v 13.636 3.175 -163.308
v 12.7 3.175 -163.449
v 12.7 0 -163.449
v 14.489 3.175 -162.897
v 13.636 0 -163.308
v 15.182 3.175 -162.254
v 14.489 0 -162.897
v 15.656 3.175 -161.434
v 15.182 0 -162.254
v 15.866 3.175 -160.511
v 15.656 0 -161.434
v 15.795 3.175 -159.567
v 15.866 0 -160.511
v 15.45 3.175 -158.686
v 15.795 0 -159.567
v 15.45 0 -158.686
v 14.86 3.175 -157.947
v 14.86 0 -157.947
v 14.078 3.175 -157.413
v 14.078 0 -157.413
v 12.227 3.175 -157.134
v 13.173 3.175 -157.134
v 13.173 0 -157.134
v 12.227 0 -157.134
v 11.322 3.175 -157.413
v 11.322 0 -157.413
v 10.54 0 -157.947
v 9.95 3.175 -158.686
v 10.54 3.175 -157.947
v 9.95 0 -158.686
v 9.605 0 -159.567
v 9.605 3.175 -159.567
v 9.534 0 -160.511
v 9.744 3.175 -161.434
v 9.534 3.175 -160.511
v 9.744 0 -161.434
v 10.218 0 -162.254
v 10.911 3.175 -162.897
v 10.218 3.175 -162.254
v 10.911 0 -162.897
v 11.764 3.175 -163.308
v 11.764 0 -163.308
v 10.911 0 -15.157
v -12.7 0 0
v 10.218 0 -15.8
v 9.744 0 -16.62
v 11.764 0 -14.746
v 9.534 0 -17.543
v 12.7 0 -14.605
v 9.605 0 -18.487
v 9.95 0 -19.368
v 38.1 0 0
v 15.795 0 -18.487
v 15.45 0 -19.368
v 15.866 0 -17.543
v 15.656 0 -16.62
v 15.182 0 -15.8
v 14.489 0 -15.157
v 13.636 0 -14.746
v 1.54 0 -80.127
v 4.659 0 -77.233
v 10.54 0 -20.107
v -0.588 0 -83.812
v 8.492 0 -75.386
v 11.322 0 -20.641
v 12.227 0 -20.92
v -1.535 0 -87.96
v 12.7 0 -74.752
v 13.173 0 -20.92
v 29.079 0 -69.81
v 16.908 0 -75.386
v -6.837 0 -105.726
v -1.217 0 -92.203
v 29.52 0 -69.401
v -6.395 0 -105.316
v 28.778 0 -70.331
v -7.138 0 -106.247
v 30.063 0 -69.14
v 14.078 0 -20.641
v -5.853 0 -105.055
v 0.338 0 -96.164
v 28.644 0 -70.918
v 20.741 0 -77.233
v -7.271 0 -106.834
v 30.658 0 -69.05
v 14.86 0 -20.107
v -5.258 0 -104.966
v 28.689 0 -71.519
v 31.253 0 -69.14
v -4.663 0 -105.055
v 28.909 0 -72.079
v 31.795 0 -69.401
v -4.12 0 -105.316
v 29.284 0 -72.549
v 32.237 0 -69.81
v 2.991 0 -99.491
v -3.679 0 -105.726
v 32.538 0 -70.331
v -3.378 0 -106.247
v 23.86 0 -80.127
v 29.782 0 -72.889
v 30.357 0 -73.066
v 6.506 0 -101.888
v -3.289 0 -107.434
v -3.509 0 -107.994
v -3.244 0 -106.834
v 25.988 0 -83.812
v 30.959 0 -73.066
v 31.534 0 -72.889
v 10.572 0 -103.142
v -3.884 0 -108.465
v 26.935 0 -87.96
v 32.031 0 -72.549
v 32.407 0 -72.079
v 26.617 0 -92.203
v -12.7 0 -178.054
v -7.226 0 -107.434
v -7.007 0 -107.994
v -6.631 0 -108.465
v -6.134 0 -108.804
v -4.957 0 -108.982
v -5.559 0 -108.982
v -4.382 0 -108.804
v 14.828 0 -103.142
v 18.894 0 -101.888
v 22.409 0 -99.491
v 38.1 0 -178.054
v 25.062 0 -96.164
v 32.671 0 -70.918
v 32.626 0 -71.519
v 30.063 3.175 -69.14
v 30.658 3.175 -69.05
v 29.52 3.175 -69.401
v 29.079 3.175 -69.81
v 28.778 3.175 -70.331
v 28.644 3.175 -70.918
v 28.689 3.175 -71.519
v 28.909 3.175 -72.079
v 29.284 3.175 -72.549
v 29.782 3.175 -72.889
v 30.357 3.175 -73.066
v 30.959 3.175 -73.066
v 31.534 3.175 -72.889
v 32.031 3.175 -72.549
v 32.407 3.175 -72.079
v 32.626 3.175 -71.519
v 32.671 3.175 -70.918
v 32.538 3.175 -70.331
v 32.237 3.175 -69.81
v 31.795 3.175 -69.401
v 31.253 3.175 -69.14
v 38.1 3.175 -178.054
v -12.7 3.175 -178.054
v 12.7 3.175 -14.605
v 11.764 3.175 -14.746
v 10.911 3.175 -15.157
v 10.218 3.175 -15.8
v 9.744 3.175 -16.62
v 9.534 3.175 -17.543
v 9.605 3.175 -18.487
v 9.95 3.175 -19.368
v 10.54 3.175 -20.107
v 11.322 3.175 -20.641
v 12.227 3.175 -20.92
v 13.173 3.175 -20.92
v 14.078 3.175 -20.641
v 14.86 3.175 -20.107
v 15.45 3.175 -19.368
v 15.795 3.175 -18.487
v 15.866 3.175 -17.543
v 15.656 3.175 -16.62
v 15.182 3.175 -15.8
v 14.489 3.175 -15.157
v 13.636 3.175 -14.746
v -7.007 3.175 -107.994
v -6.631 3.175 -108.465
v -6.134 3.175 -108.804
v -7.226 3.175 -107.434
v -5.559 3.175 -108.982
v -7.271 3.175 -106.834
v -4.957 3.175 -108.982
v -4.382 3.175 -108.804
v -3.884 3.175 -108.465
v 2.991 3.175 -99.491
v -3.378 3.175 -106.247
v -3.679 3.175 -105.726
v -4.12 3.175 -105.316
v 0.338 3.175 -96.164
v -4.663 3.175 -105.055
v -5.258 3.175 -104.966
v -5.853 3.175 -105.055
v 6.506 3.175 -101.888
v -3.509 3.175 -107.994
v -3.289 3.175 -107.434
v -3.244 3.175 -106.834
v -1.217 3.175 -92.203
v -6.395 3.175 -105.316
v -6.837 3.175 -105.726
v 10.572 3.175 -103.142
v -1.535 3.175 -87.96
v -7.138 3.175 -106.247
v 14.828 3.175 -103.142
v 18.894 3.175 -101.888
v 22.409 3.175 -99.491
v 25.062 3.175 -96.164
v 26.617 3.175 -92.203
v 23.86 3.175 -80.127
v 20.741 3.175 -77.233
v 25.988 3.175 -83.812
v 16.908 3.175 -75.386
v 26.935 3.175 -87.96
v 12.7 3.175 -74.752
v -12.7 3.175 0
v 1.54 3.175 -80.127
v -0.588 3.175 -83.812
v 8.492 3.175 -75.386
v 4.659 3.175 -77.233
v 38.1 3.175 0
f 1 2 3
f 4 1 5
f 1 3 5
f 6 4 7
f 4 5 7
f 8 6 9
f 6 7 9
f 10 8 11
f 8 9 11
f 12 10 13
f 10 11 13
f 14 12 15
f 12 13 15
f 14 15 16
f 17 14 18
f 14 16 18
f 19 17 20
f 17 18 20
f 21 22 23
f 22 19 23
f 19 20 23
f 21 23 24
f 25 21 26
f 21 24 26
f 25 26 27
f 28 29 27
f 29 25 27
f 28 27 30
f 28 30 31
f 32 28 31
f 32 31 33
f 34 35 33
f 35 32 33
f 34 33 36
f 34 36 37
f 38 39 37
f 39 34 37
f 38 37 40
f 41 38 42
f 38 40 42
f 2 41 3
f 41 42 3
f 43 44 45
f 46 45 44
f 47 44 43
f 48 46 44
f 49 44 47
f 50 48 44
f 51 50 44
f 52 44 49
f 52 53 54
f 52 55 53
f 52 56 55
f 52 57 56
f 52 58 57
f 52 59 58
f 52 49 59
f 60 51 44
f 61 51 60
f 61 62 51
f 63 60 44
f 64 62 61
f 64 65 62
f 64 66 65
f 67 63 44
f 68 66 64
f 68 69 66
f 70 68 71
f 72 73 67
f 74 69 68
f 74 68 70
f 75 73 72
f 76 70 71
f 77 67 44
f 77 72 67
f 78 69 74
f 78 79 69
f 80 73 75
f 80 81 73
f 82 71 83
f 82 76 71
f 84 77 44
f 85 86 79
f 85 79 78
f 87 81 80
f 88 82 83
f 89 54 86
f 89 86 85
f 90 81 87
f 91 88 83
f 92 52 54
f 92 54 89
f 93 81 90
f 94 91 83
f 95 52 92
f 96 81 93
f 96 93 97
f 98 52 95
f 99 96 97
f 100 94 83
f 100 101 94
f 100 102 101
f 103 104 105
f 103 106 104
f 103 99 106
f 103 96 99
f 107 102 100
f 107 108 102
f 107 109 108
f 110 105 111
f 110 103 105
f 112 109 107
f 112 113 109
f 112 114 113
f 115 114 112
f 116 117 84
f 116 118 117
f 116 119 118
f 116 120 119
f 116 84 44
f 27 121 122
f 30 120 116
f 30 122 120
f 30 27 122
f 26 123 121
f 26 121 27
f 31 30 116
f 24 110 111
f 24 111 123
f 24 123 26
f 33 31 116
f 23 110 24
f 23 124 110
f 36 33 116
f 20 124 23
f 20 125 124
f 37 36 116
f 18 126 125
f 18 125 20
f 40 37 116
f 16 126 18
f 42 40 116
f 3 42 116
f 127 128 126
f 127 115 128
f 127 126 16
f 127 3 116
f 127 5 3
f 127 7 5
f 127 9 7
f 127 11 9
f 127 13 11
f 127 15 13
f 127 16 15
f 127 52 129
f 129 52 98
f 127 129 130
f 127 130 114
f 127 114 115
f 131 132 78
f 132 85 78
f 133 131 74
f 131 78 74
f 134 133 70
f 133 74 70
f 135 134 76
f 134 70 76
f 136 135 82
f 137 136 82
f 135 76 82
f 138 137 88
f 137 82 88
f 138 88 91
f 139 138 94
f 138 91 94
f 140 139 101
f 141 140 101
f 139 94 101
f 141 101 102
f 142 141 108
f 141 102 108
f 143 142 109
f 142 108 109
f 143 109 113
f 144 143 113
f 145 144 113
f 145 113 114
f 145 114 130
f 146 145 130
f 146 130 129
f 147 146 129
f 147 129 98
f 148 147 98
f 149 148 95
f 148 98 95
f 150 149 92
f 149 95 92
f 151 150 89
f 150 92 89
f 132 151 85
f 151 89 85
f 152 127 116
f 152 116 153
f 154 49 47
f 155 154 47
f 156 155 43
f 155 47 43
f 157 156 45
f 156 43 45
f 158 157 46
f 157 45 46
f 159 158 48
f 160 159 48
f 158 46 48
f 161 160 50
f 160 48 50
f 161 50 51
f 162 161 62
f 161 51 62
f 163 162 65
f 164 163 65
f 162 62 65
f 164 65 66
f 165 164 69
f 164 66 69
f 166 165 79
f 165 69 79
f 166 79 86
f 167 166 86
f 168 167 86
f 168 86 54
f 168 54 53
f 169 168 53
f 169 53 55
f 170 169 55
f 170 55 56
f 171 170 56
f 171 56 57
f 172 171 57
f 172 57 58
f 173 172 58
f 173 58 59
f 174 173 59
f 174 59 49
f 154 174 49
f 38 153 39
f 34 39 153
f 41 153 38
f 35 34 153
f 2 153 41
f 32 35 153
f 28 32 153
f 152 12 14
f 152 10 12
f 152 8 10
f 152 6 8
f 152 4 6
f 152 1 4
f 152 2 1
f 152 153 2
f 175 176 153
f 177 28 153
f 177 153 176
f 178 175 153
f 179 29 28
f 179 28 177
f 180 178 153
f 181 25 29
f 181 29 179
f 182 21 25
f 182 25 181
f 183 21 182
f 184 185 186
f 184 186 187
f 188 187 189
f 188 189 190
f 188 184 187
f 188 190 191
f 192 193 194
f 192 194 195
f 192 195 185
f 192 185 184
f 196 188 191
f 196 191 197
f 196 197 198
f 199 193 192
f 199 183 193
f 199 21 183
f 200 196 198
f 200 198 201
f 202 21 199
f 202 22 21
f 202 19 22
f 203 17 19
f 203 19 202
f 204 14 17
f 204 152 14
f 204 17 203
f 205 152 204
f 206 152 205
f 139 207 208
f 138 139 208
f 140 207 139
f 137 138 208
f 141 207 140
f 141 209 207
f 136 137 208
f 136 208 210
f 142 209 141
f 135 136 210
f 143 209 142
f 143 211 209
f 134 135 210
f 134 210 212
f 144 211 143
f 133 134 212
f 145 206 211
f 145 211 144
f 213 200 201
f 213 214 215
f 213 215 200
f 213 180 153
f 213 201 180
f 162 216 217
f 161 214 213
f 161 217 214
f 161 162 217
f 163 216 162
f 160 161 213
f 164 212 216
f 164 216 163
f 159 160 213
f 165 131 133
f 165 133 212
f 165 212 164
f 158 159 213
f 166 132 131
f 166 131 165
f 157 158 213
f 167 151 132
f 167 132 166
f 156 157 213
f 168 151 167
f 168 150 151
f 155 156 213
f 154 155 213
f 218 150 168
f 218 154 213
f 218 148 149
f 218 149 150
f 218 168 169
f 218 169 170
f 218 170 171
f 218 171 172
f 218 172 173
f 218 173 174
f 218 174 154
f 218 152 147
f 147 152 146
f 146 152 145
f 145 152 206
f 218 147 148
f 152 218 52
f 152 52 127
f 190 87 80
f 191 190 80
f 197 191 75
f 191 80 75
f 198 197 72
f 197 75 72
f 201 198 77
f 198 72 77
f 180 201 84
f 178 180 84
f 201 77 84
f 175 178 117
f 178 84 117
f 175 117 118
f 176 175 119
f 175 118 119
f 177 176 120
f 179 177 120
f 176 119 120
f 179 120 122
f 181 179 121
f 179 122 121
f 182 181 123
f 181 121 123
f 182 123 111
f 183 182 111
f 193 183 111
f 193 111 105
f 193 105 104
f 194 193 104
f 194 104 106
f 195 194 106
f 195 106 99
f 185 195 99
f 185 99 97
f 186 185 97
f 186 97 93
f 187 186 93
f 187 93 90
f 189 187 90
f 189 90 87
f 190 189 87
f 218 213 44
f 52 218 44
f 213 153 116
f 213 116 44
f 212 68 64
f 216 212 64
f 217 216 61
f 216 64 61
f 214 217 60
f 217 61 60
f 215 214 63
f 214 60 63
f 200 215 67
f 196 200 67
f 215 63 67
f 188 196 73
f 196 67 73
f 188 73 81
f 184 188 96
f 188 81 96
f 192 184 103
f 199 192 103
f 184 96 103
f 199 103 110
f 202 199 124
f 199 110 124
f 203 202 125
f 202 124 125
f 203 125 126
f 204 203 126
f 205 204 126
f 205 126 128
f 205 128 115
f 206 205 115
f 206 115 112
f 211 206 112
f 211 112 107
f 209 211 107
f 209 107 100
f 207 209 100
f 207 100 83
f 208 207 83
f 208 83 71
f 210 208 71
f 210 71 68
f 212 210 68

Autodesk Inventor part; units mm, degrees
ref_plane "YZ Plane" through (0, 0, 0) normal (1, 0, 0) x (0, 1, 0)
ref_plane "XZ Plane" through (0, 0, 0) normal (0, 1, 0) x (-1, 0, 0)
sketch "Sketch1" plane through (0, 0, 0) normal (0, 1, 0) x (-1, 0, 0)
  line L0 (0, 0) -> (-25.4, 0)
  line L1 (-25.4, 0) -> (-25.4, -178.054)
  line L2 (-25.4, -178.054) -> (0, -178.054)
  line L3 (0, -178.054) -> (0, 0)
  dimension "d0" = 25.4
  dimension "d1" = 178.054
extrude "Extrusion1" add sketch "Sketch1" along normal blind 3.175
sketch "Sketch2" plane through (0, 3.175, 0) normal (0, 1, 0) x (1, 0, 0)
  line L0 (0, 178.054) -> (0, 0) projected
  line L1 (0, 0) -> (25.4, 0) projected
  point P0 (12.7, 17.78)
  dimension "d4" = 12.7
  dimension "d5" = 17.78
hole "Hole1" at (12.7, 3.175, -17.78) direction (0, -1, 0) diameter 6.35 end through all
ref_plane "Work Plane1" through (25.4, 0, -89.027) normal (0, 0, -1) x (-1, 0, 0)
mirror "Mirror1" about plane through (25.4, 0, -89.027) normal (0, 0, -1) of "Hole1"
sketch "Sketch3" plane through (25.4, 0, 0) normal (1, 0, 0) x (0, 0, -1)
  line L0 (0, 3.175) -> (178.054, 3.175) projected
  line L1 (0, 0) -> (178.054, 0) projected
  line L2 (0, 3.175) -> (178.054, 3.175)
  line L3 (178.054, 3.175) -> (178.054, 0)
  line L4 (178.054, 0) -> (0, 0)
  line L5 (0, 0) -> (0, 3.175)
extrude "Extrusion2" add sketch "Sketch3" along normal blind 12.7
sketch "Sketch4" plane through (0, 0, -178.054) normal (-1, 0, 0) x (0, 0, 1)
  line L0 (0, 0) -> (0, 3.175) projected
  line L1 (178.054, 0) -> (0, 0)
  line L2 (0, 0) -> (0, 3.175)
  line L3 (0, 3.175) -> (178.054, 3.175)
  line L4 (178.054, 3.175) -> (178.054, 0)
extrude "Extrusion3" add sketch "Sketch4" along normal blind 12.7
sketch "Sketch5" plane through (0, 3.175, 0) normal (0, 1, 0) x (1, 0, 0)
  line L0 (-12.7, 0) -> (-12.7, 178.054) projected
  line L1 (38.1, 0) -> (-12.7, 0) projected
  point P0 (0, 0)
  point P1 (12.7, 89.027)
  dimension "d17" = 25.4
  dimension "d18" = 89.027
hole "Hole2" at (12.7, 3.175, -89.027) direction (0, -1, 0) diameter 28.5496 end through all
sketch "Sketch6" plane through (0, 3.175, 0) normal (0, 1, 0) x (1, 0, 0)
  line L0 (38.1, 0) -> (-12.7, 0) projected
  line L1 (38.1, 0) -> (38.1, 178.054) projected
  point P0 (0, 0)
  point P1 (30.6578, 71.0692)
  dimension "d26" = 71.0692
  dimension "d27" = 7.4422
hole "Hole3" at (30.6578, 3.175, -71.0692) direction (0, -1, 0) diameter 4.0386 end through all
sketch "Sketch7" plane through (0, 3.175, 0) normal (0, 1, 0) x (1, 0, 0)
  line L0 (-12.7, 0) -> (-12.7, 178.054) projected
  line L1 (-12.7, 178.054) -> (38.1, 178.054) projected
  point P0 (0, 0)
  point P1 (-5.2578, 106.9848)
  dimension "d35" = 7.4422
  dimension "d36" = 71.0692
hole "Hole4" at (-5.2578, 3.175, -106.9848) direction (0, -1, 0) diameter 4.0386 end through all
properties part number "BAGMotor Beam"
